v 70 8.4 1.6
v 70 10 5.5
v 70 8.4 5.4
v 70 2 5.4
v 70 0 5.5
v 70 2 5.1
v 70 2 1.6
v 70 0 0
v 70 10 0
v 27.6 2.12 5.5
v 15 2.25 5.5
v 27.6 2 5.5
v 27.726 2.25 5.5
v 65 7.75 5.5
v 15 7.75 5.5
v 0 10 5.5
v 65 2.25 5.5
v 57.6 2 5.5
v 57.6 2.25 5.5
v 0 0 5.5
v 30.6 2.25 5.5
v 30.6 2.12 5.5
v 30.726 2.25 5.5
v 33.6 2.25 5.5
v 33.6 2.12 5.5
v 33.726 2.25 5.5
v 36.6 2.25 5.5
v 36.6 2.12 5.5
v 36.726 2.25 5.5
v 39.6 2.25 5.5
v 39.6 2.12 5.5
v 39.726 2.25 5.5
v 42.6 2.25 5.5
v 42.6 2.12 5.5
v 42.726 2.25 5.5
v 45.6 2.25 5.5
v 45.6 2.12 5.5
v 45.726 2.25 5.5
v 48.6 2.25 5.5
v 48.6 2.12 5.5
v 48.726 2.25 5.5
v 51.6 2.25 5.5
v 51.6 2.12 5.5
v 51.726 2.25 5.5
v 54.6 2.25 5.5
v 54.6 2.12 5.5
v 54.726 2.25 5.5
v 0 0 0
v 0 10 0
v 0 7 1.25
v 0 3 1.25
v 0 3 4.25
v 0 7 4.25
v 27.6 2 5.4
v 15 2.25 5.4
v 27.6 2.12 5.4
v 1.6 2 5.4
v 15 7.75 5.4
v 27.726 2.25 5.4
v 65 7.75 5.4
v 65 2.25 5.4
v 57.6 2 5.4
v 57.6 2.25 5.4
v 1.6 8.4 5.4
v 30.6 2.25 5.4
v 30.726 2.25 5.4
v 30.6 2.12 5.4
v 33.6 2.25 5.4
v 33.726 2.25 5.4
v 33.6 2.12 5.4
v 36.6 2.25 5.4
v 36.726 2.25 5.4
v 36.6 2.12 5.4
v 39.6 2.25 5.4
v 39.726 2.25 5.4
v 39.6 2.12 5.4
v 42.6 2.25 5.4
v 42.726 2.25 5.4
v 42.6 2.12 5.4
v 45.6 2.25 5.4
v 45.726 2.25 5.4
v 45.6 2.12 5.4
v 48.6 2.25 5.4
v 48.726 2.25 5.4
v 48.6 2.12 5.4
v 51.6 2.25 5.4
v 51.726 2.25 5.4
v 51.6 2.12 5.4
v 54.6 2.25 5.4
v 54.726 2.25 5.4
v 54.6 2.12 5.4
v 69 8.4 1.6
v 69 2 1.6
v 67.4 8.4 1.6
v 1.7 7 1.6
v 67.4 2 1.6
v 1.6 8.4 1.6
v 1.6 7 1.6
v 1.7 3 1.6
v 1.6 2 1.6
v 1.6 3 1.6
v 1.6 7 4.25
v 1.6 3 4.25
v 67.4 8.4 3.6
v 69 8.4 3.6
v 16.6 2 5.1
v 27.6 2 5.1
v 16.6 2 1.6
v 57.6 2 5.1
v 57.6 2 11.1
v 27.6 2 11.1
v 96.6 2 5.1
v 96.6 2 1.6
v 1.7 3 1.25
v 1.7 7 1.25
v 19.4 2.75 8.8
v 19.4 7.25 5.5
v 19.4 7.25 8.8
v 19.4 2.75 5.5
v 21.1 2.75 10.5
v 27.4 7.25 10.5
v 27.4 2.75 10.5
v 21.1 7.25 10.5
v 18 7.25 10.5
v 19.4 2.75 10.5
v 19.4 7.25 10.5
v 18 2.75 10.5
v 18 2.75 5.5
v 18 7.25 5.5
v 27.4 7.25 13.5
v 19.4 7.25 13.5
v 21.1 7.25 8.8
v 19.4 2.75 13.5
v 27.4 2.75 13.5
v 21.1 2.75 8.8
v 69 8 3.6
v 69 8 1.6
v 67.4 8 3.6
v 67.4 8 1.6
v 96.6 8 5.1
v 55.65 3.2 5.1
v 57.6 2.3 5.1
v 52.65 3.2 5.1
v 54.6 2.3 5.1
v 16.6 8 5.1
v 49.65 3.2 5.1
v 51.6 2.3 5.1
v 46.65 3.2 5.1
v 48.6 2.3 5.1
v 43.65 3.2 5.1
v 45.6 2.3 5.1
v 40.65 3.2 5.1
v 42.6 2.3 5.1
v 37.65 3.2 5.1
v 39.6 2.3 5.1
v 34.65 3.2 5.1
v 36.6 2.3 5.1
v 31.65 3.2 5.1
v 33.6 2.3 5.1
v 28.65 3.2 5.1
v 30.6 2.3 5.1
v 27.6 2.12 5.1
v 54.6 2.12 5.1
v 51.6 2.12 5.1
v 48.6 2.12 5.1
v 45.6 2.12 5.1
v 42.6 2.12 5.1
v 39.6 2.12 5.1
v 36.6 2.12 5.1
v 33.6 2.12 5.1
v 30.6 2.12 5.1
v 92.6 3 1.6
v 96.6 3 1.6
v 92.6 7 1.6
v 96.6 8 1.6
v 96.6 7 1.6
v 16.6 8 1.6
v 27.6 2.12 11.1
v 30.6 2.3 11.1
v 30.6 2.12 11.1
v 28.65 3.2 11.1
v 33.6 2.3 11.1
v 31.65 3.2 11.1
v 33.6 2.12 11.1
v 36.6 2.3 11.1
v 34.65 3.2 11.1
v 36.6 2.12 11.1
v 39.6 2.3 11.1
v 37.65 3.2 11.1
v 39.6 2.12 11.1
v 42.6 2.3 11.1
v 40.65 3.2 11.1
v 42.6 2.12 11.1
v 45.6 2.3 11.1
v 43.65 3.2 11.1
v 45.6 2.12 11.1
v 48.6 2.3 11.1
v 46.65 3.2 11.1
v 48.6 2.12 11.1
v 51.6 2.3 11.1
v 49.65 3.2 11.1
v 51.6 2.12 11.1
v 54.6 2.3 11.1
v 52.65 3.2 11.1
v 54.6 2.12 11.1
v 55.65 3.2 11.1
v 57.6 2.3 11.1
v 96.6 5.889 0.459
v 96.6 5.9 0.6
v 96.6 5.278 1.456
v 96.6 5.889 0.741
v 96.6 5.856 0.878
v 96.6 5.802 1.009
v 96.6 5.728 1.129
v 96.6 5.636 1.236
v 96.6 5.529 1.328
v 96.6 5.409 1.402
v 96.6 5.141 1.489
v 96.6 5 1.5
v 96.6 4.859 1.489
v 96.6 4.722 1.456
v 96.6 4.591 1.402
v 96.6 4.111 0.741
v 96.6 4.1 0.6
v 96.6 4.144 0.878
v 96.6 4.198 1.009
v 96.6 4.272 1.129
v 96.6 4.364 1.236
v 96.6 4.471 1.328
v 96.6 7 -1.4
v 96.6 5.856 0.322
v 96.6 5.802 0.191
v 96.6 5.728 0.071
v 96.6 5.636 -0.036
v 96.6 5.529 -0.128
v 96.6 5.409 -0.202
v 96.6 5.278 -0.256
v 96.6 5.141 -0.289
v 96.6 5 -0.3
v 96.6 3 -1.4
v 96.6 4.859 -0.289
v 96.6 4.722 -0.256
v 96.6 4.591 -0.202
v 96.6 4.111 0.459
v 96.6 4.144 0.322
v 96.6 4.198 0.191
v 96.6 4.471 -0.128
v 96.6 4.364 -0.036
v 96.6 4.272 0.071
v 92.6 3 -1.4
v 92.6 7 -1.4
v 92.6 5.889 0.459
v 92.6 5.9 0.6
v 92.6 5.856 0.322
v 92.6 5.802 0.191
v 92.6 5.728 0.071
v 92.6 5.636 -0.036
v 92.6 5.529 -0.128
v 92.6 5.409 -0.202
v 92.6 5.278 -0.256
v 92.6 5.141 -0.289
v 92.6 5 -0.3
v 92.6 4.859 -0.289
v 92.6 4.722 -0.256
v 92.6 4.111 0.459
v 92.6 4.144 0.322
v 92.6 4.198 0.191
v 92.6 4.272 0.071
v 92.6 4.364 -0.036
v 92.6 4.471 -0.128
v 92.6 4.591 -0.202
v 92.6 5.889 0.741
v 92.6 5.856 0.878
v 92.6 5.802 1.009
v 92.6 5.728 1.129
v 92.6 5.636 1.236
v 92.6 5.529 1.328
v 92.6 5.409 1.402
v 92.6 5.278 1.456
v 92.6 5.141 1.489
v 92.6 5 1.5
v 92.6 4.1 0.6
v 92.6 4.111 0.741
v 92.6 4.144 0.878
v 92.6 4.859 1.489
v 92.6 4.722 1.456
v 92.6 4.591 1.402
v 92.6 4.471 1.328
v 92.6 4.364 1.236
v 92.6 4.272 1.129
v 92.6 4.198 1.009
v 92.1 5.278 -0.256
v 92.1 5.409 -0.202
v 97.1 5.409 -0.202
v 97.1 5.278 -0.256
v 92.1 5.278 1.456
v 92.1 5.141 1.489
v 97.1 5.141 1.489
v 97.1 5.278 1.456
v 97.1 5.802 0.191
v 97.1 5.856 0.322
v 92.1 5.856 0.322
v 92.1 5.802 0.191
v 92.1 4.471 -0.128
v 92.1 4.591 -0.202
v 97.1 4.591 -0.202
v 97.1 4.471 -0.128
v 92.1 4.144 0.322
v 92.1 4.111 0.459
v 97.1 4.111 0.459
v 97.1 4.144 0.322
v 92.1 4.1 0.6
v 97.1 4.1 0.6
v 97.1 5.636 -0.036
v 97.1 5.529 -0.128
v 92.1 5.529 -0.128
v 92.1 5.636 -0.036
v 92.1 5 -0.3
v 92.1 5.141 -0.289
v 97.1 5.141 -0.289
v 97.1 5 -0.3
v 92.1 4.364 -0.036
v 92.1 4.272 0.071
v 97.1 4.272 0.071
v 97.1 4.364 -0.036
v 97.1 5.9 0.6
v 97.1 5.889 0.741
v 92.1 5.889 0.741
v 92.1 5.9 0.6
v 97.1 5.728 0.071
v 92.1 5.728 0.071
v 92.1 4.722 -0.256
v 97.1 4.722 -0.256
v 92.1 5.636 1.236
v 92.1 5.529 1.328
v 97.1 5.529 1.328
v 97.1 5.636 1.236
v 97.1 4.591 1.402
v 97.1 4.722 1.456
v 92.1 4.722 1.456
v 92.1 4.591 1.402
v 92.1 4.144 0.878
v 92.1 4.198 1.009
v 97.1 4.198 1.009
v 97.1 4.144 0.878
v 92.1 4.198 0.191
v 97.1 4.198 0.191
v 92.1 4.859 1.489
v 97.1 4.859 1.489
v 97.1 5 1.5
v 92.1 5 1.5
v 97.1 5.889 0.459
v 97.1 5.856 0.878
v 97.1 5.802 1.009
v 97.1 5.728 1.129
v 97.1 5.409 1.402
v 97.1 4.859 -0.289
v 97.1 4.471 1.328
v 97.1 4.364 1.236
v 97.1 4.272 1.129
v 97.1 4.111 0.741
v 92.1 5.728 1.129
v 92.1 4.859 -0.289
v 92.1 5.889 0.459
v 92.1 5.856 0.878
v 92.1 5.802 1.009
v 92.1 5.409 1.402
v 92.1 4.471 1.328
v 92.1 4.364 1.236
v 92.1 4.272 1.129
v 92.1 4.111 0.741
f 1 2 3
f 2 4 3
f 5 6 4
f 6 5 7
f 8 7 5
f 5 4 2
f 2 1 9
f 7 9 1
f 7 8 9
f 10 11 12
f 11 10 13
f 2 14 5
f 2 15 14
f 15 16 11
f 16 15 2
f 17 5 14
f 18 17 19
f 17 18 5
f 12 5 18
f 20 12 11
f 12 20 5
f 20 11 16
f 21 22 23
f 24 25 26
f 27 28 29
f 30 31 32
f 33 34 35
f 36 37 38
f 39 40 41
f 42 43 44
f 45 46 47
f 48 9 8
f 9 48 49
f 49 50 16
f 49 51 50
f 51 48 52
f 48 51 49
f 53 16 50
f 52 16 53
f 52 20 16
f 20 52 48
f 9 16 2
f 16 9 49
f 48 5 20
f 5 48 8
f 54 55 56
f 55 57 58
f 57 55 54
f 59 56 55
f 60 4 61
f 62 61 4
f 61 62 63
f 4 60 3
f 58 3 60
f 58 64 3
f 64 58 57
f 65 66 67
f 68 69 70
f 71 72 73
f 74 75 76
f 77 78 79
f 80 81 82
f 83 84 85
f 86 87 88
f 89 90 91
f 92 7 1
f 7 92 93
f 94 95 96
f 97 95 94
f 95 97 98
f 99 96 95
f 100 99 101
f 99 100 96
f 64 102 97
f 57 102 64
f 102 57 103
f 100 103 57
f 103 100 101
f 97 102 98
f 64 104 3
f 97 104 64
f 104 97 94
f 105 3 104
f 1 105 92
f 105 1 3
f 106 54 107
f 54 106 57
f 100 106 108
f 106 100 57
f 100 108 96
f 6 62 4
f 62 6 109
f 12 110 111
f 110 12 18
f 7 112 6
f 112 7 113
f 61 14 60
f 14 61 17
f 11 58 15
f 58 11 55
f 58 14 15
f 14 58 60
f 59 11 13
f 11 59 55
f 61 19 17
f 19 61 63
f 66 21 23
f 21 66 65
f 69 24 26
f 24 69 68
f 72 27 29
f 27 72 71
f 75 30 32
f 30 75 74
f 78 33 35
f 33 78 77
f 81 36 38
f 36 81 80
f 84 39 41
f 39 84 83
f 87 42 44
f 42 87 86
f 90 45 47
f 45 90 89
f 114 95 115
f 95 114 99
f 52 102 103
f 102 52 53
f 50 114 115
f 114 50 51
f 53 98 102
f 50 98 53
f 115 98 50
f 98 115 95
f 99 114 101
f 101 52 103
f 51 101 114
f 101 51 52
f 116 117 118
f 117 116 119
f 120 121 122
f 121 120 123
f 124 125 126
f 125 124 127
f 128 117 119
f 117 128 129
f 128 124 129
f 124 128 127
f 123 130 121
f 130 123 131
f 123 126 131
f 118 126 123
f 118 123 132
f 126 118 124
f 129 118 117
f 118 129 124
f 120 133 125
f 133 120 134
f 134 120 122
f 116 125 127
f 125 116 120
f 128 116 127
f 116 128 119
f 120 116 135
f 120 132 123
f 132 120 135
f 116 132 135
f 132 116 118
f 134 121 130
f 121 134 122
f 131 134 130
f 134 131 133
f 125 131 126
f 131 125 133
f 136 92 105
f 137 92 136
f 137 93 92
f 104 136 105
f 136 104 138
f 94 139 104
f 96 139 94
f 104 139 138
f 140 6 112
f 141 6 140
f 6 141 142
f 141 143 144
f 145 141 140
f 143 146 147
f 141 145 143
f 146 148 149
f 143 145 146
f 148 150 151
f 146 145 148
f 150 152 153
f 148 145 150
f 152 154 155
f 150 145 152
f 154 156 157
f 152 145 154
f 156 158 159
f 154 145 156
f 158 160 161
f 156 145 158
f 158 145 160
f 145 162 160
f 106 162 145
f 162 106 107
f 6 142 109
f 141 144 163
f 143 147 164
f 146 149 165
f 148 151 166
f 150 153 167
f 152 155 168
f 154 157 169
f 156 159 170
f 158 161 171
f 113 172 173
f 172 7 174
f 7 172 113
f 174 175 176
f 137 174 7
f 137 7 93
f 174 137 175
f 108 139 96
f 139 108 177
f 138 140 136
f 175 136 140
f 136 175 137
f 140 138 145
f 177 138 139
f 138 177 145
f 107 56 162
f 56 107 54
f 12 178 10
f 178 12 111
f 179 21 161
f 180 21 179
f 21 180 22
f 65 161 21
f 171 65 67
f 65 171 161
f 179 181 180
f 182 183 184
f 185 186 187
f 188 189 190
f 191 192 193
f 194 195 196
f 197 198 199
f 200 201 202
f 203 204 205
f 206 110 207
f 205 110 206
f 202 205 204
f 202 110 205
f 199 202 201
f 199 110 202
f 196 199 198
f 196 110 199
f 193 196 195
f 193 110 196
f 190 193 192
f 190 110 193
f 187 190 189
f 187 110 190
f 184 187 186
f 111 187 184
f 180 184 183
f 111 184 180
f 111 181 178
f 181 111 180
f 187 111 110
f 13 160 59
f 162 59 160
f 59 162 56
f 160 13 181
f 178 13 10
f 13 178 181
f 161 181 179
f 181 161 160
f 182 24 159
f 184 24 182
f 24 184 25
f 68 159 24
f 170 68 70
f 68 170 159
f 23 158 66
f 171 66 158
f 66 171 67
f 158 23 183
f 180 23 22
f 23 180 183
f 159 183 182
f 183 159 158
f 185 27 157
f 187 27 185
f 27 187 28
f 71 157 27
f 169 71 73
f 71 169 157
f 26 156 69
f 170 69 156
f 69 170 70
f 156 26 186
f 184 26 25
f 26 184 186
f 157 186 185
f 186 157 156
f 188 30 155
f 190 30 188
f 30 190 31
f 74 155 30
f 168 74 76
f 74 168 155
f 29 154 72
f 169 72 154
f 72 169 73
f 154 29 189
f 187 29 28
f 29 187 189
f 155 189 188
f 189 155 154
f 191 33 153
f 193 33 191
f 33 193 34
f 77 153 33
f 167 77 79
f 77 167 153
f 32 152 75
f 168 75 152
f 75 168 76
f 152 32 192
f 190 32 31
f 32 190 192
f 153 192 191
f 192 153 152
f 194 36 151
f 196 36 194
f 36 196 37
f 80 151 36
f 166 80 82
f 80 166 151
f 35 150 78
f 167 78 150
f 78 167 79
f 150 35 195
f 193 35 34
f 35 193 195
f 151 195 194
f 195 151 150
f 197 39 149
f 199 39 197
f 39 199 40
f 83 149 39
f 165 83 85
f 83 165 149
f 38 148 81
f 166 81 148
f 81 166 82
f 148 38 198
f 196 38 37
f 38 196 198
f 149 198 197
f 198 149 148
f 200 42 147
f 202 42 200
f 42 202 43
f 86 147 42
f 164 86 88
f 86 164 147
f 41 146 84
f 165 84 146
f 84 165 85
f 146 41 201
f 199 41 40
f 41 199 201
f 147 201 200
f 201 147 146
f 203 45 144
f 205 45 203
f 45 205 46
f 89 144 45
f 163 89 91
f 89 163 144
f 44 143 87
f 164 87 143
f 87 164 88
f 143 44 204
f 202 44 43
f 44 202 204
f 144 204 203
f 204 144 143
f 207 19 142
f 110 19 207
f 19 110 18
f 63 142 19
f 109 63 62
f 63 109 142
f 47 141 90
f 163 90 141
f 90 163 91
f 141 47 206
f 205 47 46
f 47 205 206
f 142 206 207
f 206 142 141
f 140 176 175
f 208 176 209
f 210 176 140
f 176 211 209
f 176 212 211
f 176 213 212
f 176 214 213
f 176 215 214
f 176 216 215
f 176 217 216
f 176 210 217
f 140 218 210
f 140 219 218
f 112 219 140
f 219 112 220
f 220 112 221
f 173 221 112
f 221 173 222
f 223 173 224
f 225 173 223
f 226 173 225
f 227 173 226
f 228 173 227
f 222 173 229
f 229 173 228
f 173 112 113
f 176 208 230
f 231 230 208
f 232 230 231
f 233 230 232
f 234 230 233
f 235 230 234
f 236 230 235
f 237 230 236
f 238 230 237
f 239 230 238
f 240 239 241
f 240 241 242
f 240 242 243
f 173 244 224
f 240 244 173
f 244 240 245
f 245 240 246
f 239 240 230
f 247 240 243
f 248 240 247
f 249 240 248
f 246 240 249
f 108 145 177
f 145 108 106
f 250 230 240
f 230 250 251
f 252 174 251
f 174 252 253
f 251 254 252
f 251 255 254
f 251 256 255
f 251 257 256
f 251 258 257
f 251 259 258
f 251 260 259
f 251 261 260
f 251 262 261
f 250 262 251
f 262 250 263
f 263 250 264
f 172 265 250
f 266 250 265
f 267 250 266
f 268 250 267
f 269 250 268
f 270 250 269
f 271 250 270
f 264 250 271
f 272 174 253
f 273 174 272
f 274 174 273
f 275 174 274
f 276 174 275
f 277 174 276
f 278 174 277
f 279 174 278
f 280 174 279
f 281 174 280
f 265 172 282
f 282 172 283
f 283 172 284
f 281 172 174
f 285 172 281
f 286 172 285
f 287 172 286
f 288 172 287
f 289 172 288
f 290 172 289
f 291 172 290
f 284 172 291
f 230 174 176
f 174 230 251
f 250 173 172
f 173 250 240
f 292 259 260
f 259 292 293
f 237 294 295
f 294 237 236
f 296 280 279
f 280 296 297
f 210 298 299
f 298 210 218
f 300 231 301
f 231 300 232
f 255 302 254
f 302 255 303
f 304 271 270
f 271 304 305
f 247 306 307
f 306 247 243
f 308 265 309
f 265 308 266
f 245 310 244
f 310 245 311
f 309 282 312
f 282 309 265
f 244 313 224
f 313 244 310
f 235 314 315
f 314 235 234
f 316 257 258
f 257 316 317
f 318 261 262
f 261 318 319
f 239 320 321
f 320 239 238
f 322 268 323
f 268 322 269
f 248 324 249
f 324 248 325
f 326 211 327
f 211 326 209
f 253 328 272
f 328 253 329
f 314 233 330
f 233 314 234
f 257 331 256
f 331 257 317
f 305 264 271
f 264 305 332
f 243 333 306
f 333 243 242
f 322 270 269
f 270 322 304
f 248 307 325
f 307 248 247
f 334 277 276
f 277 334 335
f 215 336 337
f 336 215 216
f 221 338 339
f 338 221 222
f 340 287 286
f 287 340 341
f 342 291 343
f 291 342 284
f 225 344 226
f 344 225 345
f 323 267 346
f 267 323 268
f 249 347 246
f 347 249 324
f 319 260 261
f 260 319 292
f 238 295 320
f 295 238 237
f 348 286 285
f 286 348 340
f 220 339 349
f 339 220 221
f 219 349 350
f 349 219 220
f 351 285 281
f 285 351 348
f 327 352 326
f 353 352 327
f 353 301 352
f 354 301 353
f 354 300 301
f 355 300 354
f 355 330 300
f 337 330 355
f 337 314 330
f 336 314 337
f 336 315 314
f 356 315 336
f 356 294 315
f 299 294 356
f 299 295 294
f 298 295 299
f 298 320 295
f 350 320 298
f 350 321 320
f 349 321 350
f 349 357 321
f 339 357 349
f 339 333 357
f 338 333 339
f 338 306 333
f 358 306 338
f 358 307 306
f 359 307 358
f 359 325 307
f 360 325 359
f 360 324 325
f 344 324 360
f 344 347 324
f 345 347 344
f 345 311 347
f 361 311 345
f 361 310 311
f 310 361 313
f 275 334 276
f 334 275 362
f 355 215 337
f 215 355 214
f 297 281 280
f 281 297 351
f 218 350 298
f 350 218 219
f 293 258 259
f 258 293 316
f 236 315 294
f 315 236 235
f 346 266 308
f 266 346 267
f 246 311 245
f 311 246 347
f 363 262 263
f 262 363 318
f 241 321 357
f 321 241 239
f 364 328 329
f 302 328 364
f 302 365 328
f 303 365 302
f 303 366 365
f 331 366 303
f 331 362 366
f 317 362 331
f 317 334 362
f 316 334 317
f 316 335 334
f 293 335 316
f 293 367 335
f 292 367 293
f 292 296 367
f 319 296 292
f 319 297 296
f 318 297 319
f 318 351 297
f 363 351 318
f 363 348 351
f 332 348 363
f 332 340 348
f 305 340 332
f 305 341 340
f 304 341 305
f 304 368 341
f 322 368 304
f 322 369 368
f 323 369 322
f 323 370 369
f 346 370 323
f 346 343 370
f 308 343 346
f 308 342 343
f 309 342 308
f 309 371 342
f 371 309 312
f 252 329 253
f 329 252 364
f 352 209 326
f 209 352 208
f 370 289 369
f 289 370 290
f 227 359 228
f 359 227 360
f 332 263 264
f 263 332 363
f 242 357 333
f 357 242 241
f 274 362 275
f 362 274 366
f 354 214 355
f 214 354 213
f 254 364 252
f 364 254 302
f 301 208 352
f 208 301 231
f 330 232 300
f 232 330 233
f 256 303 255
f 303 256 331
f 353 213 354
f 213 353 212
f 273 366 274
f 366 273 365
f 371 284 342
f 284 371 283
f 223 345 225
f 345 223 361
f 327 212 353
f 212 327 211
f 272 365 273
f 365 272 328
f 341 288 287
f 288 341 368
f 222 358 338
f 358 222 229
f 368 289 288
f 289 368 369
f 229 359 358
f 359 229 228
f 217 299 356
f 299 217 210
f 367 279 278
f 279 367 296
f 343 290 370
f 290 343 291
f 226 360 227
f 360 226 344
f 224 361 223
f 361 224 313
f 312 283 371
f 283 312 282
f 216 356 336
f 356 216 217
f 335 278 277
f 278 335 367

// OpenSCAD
TOOTH_PITCH    = 3.0;
TOOTH_DEPTH    = 1.2;
TOOTH_ANGLE    = 20;
RAMP_ANGLE     = 55;

RAIL_W         = 6.0;
RAIL_H         = 3.5;
RAIL_LEN       = 38.0;

OUTER_W        = 10.0;
OUTER_H        = 5.5;
OUTER_LEN      = 70.0;

INNER_LEN      = 80.0;
INNER_W        = RAIL_W - 0.4;
INNER_H        = RAIL_H - 0.3;

PAWL_W         = 4.5;
PAWL_H         = 5.0;
PAWL_THICKNESS = 1.4;
RELEASE_TAB_L  = 8.0;
RELEASE_TAB_H  = 3.0;

PIN_D          = 1.8;
WALL           = 1.6;

$fn = 40;

module single_tooth(h=RAIL_H) {

    polygon([
        [0,            0],
        [TOOTH_PITCH,  0],
        [TOOTH_PITCH,  TOOTH_DEPTH * 0.25],
        [TOOTH_PITCH * 0.35, TOOTH_DEPTH],
        [0,            TOOTH_DEPTH * 0.1]
    ]);
}

module toothed_rail() {
    difference() {
        cube([RAIL_LEN, RAIL_W, RAIL_H]);

        translate([RAIL_LEN - RAIL_H/2, RAIL_W/2, -0.1])
            cylinder(h=RAIL_H+0.2, r=RAIL_H/2);
    }

    n_teeth = floor(RAIL_LEN / TOOTH_PITCH) - 2;
    for (i = [1 : n_teeth]) {
        translate([i * TOOTH_PITCH, 0, RAIL_H])
        linear_extrude(height=RAIL_W, center=false)
        rotate([0,0,0])
        single_tooth();
    }
}

module inner_arm() {
    color("LightGray")
    union() {

        cube([INNER_LEN, RAIL_W, RAIL_H]);

        translate([8, 0, 0])
            toothed_rail();

        translate([INNER_LEN - 4, RAIL_W/2 - 2, -3])
            cube([4, 4, 3 + RAIL_H]);

        translate([INNER_LEN - 2, RAIL_W/2, -3 + 2])
            rotate([0, 90, 0])
            cylinder(h=5, d=PIN_D, center=true);
    }
}

module pawl() {
    color("DimGray")
    union() {

        cube([PAWL_THICKNESS, PAWL_W, PAWL_H]);

        translate([PAWL_THICKNESS, 0, PAWL_H - TOOTH_DEPTH - 0.5])
        union() {
            cube([TOOTH_DEPTH + 0.5, PAWL_W, TOOTH_DEPTH + 0.5]);
        }

        translate([PAWL_THICKNESS, 0, PAWL_H])
            cube([RELEASE_TAB_L, PAWL_W, RELEASE_TAB_H]);

    }
}

module outer_sleeve() {
    color("SlateGray")
    difference() {

        cube([OUTER_LEN, OUTER_W, OUTER_H]);

        translate([WALL, (OUTER_W - RAIL_W)/2, WALL])
            cube([OUTER_LEN - WALL, RAIL_W + 0.4, RAIL_H + 0.3]);

        translate([15, (OUTER_W - PAWL_W)/2 - 0.5, OUTER_H - WALL - 0.1])
            cube([OUTER_LEN - 20, PAWL_W + 1, WALL + 0.2]);

        translate([-0.1, OUTER_W/2 - 2, OUTER_H/2 - 1.5])
            cube([WALL + 0.2, 4, 3]);
    }

    translate([18, (OUTER_W - PAWL_W)/2, OUTER_H])
        pawl();

    translate([OUTER_LEN - WALL - 1, (OUTER_W - RAIL_W)/2, WALL])
        cube([WALL, RAIL_W + 0.4, 2]);
}

module assembled(extension_mm = 15) {

    outer_sleeve();

    translate([WALL + extension_mm, (OUTER_W - RAIL_W)/2, WALL])
        inner_arm();
}

module exploded() {

    outer_sleeve();

    translate([WALL, (OUTER_W - RAIL_W)/2, 22])
        inner_arm();

    color("Red", 0.5) {
        translate([0, -3, OUTER_H/2])
            cube([OUTER_LEN, 0.5, 0.5]);
        translate([WALL, -3, OUTER_H/2])
            cube([35, 0.5, 0.5]);
    }
}

assembled(15);
